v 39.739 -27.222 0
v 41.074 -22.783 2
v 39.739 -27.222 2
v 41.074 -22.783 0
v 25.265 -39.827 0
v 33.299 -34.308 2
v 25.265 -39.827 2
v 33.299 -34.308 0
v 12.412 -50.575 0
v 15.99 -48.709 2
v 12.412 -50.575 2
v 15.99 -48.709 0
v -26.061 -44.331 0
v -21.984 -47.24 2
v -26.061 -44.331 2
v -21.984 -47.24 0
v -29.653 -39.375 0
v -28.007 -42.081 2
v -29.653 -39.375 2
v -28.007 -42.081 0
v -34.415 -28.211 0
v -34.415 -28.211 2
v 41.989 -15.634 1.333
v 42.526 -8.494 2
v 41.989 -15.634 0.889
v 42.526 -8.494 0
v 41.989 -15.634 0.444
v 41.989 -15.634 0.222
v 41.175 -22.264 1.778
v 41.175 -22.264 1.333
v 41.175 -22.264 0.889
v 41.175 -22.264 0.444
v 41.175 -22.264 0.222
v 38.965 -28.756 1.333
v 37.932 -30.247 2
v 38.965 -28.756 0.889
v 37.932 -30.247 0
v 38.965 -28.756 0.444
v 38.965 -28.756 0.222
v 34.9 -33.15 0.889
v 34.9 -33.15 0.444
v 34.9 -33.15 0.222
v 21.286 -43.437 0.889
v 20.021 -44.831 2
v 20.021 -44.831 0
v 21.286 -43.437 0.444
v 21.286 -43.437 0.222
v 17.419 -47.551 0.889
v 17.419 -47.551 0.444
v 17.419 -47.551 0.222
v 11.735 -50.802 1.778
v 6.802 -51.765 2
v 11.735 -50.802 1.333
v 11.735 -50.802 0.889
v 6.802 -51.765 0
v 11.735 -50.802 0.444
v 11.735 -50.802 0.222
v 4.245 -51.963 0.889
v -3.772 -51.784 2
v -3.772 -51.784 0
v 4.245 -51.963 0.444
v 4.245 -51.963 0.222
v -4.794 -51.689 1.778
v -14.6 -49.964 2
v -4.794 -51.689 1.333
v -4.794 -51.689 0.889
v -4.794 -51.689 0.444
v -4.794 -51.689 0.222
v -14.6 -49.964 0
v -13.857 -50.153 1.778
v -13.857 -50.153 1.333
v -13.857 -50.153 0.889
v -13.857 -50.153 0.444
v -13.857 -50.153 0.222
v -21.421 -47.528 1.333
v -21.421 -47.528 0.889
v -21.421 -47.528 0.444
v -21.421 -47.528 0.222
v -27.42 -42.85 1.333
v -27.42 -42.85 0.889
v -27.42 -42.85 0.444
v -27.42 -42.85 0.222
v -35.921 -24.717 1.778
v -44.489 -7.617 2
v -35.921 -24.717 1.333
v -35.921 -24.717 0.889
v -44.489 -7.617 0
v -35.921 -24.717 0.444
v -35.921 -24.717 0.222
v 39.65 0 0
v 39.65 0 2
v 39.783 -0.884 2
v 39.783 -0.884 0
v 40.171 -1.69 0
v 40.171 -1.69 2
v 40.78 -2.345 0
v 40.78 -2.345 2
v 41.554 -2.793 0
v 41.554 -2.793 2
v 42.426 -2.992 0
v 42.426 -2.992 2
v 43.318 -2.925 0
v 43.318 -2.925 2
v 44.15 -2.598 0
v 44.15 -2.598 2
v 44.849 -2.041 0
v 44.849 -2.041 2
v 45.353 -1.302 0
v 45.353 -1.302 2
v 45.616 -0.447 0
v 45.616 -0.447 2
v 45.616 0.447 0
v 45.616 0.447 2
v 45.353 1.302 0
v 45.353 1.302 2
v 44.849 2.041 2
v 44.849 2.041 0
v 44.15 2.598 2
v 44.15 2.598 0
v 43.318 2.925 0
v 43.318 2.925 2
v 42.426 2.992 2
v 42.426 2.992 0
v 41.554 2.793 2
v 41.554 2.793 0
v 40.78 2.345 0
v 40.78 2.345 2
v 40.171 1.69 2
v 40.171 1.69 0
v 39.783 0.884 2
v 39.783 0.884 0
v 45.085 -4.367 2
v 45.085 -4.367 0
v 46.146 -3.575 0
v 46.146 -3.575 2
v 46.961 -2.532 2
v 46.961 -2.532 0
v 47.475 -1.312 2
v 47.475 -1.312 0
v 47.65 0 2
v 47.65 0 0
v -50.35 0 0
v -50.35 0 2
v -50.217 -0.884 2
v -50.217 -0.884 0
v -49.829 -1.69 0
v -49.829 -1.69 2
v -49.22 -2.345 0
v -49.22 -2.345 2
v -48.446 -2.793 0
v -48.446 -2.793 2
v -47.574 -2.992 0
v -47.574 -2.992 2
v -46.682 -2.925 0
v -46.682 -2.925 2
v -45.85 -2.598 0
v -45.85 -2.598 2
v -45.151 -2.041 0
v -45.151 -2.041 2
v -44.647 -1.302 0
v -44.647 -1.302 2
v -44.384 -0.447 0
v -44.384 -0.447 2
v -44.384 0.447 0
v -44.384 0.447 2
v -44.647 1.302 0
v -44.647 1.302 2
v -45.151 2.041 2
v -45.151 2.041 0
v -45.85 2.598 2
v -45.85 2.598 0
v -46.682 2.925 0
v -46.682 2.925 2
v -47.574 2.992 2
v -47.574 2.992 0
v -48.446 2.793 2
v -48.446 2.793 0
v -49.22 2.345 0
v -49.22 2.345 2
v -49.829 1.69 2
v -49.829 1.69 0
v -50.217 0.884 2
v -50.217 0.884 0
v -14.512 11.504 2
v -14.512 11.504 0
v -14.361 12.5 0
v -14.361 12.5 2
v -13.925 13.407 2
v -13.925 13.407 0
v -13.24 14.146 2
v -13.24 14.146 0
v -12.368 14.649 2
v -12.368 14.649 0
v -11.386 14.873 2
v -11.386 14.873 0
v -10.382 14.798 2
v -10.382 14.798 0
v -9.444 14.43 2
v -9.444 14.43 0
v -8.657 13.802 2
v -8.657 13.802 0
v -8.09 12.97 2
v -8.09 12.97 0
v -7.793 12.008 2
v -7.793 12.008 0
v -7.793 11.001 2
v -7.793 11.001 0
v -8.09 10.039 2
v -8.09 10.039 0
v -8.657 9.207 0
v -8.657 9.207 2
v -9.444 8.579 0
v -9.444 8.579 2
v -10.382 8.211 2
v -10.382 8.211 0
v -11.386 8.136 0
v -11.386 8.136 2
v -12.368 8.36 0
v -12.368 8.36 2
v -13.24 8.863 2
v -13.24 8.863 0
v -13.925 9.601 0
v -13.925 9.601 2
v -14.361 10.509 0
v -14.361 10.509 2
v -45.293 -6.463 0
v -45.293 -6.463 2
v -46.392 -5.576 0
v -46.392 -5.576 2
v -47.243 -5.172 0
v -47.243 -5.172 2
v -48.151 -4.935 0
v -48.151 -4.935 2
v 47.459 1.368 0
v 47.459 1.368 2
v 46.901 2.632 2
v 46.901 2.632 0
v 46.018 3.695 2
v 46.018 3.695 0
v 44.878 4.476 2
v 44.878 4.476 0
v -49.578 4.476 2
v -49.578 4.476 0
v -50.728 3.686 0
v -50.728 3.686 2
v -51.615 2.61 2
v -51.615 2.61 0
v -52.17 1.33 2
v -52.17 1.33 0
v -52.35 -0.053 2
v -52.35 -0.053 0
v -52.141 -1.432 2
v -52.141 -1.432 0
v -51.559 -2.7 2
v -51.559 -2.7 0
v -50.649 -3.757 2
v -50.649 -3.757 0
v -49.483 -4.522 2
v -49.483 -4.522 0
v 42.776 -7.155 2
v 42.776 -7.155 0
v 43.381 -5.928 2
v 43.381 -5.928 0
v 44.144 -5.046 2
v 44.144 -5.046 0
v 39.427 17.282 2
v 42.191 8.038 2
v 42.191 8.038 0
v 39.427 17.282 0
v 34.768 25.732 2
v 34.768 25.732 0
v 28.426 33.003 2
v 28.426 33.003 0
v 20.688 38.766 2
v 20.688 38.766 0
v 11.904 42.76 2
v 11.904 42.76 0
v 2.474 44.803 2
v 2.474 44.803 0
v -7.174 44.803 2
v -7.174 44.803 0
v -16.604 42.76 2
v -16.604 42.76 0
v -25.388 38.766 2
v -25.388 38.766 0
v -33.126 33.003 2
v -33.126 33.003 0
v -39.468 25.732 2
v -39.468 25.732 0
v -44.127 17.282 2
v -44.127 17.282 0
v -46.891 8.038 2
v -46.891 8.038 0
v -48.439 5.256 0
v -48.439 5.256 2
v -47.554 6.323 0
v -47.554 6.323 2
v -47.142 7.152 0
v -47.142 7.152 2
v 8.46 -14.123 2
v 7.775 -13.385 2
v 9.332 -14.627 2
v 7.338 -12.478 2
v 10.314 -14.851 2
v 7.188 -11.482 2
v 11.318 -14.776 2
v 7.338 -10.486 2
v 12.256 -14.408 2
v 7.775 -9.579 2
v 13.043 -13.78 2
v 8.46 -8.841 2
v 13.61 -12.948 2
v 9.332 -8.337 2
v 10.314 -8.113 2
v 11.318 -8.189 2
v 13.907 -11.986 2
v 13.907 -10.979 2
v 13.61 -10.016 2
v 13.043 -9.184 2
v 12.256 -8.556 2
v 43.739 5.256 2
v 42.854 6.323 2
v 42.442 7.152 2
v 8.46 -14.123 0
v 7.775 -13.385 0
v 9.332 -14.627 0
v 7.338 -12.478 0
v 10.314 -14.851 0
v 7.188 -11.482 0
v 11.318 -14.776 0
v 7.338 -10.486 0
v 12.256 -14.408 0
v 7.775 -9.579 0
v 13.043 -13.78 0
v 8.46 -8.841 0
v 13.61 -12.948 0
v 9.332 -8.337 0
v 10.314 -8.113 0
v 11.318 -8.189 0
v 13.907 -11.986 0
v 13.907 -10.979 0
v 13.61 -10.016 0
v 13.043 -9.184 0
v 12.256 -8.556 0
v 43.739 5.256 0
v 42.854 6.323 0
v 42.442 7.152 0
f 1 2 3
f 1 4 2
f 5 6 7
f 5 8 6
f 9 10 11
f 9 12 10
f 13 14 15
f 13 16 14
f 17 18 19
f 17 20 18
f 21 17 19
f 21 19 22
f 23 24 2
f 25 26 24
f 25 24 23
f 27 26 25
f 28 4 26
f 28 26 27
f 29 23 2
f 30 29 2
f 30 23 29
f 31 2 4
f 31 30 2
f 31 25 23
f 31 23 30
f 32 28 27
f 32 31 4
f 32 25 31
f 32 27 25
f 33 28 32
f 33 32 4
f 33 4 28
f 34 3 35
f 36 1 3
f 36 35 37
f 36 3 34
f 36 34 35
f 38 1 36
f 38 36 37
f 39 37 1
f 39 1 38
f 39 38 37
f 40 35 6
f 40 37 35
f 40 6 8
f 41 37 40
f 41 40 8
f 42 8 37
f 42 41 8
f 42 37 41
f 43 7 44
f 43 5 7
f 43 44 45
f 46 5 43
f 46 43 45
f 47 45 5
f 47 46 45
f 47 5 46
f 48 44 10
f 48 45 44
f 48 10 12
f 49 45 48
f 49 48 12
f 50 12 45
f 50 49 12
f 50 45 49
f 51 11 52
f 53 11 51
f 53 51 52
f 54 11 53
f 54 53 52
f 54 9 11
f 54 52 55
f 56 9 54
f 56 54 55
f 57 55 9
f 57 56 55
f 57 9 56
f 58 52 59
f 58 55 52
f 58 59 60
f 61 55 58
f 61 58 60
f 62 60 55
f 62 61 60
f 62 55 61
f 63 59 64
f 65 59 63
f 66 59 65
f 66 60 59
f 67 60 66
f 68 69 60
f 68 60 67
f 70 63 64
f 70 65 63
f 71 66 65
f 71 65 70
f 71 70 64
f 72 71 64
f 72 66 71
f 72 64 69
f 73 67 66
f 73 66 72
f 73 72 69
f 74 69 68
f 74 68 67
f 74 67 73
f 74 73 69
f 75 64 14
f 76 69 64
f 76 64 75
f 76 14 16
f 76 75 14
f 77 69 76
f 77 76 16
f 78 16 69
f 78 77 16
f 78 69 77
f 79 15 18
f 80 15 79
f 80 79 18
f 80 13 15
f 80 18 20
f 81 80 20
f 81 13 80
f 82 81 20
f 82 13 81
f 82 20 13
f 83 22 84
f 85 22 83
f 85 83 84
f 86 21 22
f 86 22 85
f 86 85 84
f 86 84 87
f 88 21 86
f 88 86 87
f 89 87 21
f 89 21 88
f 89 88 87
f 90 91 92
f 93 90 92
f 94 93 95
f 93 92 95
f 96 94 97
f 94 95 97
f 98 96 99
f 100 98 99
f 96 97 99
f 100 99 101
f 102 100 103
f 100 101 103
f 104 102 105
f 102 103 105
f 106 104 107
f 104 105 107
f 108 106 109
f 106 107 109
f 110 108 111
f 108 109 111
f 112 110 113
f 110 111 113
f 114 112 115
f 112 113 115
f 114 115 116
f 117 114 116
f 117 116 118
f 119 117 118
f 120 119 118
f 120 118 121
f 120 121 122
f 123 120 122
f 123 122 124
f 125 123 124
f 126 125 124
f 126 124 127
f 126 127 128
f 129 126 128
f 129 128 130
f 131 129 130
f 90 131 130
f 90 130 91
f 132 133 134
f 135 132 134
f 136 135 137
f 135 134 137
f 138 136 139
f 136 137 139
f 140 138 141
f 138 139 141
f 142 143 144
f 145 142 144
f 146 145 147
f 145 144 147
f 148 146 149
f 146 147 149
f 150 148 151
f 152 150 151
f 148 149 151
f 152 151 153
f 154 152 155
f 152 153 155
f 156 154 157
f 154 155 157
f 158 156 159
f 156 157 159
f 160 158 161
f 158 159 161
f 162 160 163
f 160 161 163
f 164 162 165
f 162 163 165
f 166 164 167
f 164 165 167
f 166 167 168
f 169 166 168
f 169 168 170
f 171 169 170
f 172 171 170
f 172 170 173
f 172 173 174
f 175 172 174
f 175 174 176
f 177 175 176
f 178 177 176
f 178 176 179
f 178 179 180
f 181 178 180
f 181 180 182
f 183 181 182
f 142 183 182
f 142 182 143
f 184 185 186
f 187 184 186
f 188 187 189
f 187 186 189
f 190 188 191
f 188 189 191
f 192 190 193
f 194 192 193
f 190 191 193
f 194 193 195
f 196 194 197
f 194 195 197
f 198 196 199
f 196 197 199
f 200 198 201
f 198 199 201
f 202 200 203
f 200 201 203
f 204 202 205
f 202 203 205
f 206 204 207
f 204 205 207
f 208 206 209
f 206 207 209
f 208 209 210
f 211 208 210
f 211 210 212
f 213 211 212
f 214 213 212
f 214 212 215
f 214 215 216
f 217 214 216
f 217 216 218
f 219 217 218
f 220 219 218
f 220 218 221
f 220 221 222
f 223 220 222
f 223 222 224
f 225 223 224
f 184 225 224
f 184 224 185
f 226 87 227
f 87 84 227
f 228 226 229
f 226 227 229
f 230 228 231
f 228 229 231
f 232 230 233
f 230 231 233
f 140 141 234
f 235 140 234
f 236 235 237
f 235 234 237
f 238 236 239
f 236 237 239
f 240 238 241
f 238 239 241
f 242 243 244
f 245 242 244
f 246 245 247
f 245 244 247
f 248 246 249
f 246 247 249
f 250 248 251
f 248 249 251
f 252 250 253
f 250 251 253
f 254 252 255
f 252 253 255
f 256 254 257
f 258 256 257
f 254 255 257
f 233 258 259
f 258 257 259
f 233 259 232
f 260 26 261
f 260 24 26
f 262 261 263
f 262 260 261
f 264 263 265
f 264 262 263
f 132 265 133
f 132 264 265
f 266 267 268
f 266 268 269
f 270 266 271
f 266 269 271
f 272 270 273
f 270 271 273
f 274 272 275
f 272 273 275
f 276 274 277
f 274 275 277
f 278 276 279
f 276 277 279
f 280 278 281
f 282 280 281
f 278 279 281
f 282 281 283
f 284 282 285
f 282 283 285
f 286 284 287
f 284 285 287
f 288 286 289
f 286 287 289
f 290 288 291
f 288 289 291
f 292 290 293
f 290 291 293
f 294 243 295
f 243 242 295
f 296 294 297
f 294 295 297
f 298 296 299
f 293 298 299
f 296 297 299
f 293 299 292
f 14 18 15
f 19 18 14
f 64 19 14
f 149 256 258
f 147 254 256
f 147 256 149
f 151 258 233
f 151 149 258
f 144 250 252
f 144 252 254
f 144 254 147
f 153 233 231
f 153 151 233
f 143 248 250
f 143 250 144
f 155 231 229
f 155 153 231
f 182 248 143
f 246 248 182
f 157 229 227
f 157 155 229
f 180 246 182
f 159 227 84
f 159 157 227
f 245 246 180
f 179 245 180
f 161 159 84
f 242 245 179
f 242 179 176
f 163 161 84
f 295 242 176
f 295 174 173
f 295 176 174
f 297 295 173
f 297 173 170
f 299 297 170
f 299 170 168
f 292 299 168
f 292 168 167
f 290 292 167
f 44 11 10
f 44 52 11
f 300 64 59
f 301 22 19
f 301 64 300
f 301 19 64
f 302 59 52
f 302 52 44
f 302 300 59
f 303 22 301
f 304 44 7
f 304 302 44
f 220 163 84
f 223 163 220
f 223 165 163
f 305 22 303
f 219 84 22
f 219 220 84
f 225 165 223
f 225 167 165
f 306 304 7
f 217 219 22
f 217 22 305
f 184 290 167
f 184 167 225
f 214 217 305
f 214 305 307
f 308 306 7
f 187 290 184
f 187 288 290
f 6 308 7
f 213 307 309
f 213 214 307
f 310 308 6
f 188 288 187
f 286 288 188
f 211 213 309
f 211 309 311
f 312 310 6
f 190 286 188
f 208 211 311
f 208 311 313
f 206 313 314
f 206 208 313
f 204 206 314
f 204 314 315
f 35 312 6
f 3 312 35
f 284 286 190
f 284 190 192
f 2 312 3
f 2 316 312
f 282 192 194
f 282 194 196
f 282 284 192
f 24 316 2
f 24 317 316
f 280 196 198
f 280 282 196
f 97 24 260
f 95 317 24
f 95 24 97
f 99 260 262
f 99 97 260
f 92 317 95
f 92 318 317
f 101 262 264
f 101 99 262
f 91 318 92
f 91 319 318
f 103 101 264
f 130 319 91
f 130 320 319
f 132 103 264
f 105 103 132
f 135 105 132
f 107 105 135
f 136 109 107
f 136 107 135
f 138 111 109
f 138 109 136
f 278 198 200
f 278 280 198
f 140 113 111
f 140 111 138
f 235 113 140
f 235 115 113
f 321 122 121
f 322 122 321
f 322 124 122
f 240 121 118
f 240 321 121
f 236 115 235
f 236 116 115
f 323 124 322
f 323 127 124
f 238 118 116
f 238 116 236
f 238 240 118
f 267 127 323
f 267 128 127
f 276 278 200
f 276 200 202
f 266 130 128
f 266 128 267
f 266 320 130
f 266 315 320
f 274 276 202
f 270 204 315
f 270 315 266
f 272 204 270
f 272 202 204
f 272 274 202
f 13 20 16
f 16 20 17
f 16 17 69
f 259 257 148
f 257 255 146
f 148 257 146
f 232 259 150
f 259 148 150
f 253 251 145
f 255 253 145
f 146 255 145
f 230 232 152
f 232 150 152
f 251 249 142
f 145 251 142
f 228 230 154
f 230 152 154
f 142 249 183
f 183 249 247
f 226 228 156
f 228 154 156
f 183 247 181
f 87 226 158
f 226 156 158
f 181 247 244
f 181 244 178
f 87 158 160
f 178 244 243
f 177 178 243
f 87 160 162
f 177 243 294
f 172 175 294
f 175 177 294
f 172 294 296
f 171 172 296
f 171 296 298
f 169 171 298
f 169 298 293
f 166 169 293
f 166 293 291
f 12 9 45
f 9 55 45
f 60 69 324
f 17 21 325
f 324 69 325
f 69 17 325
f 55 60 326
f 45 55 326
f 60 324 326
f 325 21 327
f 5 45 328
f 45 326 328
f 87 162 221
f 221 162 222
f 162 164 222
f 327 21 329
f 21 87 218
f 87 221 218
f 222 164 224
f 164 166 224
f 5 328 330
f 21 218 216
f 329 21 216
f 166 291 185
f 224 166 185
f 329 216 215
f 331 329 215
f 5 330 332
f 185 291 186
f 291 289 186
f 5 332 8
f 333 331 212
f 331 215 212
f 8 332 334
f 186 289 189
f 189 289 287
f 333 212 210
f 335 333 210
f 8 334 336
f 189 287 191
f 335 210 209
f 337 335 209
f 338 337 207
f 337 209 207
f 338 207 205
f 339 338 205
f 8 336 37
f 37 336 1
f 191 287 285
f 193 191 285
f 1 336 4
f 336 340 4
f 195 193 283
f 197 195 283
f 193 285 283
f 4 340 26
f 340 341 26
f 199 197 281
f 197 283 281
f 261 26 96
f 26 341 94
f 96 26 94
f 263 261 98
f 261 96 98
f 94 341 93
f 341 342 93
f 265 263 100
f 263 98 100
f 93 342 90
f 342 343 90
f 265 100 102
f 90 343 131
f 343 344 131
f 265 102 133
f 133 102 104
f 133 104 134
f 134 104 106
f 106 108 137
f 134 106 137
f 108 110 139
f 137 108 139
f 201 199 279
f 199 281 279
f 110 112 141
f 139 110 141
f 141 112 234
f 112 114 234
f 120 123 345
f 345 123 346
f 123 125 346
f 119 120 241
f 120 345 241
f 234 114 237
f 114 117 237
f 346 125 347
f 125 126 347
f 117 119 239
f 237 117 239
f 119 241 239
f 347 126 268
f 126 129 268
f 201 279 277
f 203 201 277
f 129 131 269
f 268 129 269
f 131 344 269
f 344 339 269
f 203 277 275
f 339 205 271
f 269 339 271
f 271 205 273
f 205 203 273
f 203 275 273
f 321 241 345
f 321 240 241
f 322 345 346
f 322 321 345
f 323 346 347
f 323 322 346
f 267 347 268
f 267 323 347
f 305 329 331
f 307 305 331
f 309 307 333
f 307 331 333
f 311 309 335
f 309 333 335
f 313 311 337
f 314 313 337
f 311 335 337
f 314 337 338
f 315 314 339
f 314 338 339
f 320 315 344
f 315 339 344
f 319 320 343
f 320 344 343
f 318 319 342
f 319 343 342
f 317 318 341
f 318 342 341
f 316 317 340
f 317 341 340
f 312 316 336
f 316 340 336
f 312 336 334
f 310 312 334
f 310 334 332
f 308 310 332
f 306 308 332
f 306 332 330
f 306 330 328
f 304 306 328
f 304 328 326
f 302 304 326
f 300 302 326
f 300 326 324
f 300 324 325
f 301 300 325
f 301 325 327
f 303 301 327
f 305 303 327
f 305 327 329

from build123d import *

# Parameters (mm, degrees)
F1_DEPTH = 2
F2_D     = 6
F2_DEPTH = 15
F2_TIP   = 1.8025818571
F3_R     = 5
F5_D     = 6.7564
F5_DEPTH = 15
F5_TIP   = 2.0298273432


# Not quite as in the source:
# - a feature names something its author has since deleted; it is built from what else it names


with BuildPart() as f1:
    # F0 (on Top) → F1 (new body)
    with BuildSketch(Plane.XY):
        with BuildLine():
            ThreePointArc((-47.3500001504, 5), (-43.8144662445, 3.5355339059), (-42.3500001504, 0))
            ThreePointArc((-42.3500001504, 0), (-43.3356192267, -2.9807290717), (-45.90389847, -4.7863127698))
            add(Edge.make_bspline(
                [(42.6499998496, -5), (42.5289111679, -9.8051674108), (42.0457129188, -14.7439877194), (40.7461175667, -30.1142148215), (29.7360021605, -36.317695818), (20.6555192756, -43.1714469496), (13.3678454871, -54.4108770899), (-23.6320989357, -50.5771015914), (-30.9587242182, -37.5079780838), (-35.7625076425, -23.9287004601), (-42.056342597, -12.5684016954), (-45.90389847, -4.7863127698)],
                knots=[0, 0, 0, 0, 0.0930383933, 0.1976366945, 0.2961687037, 0.3908471592, 0.4898375832, 0.6543651822, 0.7604357564, 0.8654232461, 1, 1, 1, 1], degree=3))
            ThreePointArc((42.6499998496, -5), (37.6499998496, 0), (42.6499998496, 5))
            ThreePointArc((42.6499998496, 5), (-2.3500001504, 45.0609898081), (-47.3500001504, 5))
        make_face()
        with BuildLine():
            ThreePointArc((-45.90389847, -4.7863127698), (-43.3356192267, -2.9807290717), (-42.3500001504, 0))
            ThreePointArc((-42.3500001504, 0), (-43.8144662445, 3.5355339059), (-47.3500001504, 5))
            ThreePointArc((-47.3500001504, 5), (-52.2962898634, -0.730902234), (-45.90389847, -4.7863127698))
        make_face()
        with BuildLine():
            ThreePointArc((47.6499998496, 0), (46.1855337555, 3.5355339059), (42.6499998496, 5))
            ThreePointArc((42.6499998496, 5), (37.6499998496, 0), (42.6499998496, -5))
            ThreePointArc((42.6499998496, -5), (46.1855337555, -3.5355339059), (47.6499998496, 0))
        make_face()
    extrude(amount=F1_DEPTH)

    # F2
    with Locations(Plane(origin=(0, 0, 0), x_dir=(1, 0, 0), z_dir=(0, 0, -1))):
        with Locations((-47.3500001504, 0), (42.6499998496, 0)):
            Hole(F2_D / 2, depth=F2_DEPTH)
            with Locations((0, 0, -(F2_DEPTH + F2_TIP / 2))):  # 118° drill point
                Cone(0, F2_D / 2, F2_TIP, mode=Mode.SUBTRACT)

    # F3
    f3_edges = [f1.edges().sort_by_distance(p)[0] for p in [
        (-47.35, 5, 1),
        (-45.903898, -4.786313, 1),
        (42.65, 5, 1),
        (42.65, -5, 1),
    ]]
    fillet(f3_edges, radius=F3_R)

    # F5
    with Locations(Plane.XY.offset(2)):
        with Locations((-11.1333334838, 11.5044798038), (10.5664664879, -11.4821037278)):
            Hole(F5_D / 2, depth=F5_DEPTH)
            with Locations((0, 0, -(F5_DEPTH + F5_TIP / 2))):  # 118° drill point
                Cone(0, F5_D / 2, F5_TIP, mode=Mode.SUBTRACT)


solid = f1.part
